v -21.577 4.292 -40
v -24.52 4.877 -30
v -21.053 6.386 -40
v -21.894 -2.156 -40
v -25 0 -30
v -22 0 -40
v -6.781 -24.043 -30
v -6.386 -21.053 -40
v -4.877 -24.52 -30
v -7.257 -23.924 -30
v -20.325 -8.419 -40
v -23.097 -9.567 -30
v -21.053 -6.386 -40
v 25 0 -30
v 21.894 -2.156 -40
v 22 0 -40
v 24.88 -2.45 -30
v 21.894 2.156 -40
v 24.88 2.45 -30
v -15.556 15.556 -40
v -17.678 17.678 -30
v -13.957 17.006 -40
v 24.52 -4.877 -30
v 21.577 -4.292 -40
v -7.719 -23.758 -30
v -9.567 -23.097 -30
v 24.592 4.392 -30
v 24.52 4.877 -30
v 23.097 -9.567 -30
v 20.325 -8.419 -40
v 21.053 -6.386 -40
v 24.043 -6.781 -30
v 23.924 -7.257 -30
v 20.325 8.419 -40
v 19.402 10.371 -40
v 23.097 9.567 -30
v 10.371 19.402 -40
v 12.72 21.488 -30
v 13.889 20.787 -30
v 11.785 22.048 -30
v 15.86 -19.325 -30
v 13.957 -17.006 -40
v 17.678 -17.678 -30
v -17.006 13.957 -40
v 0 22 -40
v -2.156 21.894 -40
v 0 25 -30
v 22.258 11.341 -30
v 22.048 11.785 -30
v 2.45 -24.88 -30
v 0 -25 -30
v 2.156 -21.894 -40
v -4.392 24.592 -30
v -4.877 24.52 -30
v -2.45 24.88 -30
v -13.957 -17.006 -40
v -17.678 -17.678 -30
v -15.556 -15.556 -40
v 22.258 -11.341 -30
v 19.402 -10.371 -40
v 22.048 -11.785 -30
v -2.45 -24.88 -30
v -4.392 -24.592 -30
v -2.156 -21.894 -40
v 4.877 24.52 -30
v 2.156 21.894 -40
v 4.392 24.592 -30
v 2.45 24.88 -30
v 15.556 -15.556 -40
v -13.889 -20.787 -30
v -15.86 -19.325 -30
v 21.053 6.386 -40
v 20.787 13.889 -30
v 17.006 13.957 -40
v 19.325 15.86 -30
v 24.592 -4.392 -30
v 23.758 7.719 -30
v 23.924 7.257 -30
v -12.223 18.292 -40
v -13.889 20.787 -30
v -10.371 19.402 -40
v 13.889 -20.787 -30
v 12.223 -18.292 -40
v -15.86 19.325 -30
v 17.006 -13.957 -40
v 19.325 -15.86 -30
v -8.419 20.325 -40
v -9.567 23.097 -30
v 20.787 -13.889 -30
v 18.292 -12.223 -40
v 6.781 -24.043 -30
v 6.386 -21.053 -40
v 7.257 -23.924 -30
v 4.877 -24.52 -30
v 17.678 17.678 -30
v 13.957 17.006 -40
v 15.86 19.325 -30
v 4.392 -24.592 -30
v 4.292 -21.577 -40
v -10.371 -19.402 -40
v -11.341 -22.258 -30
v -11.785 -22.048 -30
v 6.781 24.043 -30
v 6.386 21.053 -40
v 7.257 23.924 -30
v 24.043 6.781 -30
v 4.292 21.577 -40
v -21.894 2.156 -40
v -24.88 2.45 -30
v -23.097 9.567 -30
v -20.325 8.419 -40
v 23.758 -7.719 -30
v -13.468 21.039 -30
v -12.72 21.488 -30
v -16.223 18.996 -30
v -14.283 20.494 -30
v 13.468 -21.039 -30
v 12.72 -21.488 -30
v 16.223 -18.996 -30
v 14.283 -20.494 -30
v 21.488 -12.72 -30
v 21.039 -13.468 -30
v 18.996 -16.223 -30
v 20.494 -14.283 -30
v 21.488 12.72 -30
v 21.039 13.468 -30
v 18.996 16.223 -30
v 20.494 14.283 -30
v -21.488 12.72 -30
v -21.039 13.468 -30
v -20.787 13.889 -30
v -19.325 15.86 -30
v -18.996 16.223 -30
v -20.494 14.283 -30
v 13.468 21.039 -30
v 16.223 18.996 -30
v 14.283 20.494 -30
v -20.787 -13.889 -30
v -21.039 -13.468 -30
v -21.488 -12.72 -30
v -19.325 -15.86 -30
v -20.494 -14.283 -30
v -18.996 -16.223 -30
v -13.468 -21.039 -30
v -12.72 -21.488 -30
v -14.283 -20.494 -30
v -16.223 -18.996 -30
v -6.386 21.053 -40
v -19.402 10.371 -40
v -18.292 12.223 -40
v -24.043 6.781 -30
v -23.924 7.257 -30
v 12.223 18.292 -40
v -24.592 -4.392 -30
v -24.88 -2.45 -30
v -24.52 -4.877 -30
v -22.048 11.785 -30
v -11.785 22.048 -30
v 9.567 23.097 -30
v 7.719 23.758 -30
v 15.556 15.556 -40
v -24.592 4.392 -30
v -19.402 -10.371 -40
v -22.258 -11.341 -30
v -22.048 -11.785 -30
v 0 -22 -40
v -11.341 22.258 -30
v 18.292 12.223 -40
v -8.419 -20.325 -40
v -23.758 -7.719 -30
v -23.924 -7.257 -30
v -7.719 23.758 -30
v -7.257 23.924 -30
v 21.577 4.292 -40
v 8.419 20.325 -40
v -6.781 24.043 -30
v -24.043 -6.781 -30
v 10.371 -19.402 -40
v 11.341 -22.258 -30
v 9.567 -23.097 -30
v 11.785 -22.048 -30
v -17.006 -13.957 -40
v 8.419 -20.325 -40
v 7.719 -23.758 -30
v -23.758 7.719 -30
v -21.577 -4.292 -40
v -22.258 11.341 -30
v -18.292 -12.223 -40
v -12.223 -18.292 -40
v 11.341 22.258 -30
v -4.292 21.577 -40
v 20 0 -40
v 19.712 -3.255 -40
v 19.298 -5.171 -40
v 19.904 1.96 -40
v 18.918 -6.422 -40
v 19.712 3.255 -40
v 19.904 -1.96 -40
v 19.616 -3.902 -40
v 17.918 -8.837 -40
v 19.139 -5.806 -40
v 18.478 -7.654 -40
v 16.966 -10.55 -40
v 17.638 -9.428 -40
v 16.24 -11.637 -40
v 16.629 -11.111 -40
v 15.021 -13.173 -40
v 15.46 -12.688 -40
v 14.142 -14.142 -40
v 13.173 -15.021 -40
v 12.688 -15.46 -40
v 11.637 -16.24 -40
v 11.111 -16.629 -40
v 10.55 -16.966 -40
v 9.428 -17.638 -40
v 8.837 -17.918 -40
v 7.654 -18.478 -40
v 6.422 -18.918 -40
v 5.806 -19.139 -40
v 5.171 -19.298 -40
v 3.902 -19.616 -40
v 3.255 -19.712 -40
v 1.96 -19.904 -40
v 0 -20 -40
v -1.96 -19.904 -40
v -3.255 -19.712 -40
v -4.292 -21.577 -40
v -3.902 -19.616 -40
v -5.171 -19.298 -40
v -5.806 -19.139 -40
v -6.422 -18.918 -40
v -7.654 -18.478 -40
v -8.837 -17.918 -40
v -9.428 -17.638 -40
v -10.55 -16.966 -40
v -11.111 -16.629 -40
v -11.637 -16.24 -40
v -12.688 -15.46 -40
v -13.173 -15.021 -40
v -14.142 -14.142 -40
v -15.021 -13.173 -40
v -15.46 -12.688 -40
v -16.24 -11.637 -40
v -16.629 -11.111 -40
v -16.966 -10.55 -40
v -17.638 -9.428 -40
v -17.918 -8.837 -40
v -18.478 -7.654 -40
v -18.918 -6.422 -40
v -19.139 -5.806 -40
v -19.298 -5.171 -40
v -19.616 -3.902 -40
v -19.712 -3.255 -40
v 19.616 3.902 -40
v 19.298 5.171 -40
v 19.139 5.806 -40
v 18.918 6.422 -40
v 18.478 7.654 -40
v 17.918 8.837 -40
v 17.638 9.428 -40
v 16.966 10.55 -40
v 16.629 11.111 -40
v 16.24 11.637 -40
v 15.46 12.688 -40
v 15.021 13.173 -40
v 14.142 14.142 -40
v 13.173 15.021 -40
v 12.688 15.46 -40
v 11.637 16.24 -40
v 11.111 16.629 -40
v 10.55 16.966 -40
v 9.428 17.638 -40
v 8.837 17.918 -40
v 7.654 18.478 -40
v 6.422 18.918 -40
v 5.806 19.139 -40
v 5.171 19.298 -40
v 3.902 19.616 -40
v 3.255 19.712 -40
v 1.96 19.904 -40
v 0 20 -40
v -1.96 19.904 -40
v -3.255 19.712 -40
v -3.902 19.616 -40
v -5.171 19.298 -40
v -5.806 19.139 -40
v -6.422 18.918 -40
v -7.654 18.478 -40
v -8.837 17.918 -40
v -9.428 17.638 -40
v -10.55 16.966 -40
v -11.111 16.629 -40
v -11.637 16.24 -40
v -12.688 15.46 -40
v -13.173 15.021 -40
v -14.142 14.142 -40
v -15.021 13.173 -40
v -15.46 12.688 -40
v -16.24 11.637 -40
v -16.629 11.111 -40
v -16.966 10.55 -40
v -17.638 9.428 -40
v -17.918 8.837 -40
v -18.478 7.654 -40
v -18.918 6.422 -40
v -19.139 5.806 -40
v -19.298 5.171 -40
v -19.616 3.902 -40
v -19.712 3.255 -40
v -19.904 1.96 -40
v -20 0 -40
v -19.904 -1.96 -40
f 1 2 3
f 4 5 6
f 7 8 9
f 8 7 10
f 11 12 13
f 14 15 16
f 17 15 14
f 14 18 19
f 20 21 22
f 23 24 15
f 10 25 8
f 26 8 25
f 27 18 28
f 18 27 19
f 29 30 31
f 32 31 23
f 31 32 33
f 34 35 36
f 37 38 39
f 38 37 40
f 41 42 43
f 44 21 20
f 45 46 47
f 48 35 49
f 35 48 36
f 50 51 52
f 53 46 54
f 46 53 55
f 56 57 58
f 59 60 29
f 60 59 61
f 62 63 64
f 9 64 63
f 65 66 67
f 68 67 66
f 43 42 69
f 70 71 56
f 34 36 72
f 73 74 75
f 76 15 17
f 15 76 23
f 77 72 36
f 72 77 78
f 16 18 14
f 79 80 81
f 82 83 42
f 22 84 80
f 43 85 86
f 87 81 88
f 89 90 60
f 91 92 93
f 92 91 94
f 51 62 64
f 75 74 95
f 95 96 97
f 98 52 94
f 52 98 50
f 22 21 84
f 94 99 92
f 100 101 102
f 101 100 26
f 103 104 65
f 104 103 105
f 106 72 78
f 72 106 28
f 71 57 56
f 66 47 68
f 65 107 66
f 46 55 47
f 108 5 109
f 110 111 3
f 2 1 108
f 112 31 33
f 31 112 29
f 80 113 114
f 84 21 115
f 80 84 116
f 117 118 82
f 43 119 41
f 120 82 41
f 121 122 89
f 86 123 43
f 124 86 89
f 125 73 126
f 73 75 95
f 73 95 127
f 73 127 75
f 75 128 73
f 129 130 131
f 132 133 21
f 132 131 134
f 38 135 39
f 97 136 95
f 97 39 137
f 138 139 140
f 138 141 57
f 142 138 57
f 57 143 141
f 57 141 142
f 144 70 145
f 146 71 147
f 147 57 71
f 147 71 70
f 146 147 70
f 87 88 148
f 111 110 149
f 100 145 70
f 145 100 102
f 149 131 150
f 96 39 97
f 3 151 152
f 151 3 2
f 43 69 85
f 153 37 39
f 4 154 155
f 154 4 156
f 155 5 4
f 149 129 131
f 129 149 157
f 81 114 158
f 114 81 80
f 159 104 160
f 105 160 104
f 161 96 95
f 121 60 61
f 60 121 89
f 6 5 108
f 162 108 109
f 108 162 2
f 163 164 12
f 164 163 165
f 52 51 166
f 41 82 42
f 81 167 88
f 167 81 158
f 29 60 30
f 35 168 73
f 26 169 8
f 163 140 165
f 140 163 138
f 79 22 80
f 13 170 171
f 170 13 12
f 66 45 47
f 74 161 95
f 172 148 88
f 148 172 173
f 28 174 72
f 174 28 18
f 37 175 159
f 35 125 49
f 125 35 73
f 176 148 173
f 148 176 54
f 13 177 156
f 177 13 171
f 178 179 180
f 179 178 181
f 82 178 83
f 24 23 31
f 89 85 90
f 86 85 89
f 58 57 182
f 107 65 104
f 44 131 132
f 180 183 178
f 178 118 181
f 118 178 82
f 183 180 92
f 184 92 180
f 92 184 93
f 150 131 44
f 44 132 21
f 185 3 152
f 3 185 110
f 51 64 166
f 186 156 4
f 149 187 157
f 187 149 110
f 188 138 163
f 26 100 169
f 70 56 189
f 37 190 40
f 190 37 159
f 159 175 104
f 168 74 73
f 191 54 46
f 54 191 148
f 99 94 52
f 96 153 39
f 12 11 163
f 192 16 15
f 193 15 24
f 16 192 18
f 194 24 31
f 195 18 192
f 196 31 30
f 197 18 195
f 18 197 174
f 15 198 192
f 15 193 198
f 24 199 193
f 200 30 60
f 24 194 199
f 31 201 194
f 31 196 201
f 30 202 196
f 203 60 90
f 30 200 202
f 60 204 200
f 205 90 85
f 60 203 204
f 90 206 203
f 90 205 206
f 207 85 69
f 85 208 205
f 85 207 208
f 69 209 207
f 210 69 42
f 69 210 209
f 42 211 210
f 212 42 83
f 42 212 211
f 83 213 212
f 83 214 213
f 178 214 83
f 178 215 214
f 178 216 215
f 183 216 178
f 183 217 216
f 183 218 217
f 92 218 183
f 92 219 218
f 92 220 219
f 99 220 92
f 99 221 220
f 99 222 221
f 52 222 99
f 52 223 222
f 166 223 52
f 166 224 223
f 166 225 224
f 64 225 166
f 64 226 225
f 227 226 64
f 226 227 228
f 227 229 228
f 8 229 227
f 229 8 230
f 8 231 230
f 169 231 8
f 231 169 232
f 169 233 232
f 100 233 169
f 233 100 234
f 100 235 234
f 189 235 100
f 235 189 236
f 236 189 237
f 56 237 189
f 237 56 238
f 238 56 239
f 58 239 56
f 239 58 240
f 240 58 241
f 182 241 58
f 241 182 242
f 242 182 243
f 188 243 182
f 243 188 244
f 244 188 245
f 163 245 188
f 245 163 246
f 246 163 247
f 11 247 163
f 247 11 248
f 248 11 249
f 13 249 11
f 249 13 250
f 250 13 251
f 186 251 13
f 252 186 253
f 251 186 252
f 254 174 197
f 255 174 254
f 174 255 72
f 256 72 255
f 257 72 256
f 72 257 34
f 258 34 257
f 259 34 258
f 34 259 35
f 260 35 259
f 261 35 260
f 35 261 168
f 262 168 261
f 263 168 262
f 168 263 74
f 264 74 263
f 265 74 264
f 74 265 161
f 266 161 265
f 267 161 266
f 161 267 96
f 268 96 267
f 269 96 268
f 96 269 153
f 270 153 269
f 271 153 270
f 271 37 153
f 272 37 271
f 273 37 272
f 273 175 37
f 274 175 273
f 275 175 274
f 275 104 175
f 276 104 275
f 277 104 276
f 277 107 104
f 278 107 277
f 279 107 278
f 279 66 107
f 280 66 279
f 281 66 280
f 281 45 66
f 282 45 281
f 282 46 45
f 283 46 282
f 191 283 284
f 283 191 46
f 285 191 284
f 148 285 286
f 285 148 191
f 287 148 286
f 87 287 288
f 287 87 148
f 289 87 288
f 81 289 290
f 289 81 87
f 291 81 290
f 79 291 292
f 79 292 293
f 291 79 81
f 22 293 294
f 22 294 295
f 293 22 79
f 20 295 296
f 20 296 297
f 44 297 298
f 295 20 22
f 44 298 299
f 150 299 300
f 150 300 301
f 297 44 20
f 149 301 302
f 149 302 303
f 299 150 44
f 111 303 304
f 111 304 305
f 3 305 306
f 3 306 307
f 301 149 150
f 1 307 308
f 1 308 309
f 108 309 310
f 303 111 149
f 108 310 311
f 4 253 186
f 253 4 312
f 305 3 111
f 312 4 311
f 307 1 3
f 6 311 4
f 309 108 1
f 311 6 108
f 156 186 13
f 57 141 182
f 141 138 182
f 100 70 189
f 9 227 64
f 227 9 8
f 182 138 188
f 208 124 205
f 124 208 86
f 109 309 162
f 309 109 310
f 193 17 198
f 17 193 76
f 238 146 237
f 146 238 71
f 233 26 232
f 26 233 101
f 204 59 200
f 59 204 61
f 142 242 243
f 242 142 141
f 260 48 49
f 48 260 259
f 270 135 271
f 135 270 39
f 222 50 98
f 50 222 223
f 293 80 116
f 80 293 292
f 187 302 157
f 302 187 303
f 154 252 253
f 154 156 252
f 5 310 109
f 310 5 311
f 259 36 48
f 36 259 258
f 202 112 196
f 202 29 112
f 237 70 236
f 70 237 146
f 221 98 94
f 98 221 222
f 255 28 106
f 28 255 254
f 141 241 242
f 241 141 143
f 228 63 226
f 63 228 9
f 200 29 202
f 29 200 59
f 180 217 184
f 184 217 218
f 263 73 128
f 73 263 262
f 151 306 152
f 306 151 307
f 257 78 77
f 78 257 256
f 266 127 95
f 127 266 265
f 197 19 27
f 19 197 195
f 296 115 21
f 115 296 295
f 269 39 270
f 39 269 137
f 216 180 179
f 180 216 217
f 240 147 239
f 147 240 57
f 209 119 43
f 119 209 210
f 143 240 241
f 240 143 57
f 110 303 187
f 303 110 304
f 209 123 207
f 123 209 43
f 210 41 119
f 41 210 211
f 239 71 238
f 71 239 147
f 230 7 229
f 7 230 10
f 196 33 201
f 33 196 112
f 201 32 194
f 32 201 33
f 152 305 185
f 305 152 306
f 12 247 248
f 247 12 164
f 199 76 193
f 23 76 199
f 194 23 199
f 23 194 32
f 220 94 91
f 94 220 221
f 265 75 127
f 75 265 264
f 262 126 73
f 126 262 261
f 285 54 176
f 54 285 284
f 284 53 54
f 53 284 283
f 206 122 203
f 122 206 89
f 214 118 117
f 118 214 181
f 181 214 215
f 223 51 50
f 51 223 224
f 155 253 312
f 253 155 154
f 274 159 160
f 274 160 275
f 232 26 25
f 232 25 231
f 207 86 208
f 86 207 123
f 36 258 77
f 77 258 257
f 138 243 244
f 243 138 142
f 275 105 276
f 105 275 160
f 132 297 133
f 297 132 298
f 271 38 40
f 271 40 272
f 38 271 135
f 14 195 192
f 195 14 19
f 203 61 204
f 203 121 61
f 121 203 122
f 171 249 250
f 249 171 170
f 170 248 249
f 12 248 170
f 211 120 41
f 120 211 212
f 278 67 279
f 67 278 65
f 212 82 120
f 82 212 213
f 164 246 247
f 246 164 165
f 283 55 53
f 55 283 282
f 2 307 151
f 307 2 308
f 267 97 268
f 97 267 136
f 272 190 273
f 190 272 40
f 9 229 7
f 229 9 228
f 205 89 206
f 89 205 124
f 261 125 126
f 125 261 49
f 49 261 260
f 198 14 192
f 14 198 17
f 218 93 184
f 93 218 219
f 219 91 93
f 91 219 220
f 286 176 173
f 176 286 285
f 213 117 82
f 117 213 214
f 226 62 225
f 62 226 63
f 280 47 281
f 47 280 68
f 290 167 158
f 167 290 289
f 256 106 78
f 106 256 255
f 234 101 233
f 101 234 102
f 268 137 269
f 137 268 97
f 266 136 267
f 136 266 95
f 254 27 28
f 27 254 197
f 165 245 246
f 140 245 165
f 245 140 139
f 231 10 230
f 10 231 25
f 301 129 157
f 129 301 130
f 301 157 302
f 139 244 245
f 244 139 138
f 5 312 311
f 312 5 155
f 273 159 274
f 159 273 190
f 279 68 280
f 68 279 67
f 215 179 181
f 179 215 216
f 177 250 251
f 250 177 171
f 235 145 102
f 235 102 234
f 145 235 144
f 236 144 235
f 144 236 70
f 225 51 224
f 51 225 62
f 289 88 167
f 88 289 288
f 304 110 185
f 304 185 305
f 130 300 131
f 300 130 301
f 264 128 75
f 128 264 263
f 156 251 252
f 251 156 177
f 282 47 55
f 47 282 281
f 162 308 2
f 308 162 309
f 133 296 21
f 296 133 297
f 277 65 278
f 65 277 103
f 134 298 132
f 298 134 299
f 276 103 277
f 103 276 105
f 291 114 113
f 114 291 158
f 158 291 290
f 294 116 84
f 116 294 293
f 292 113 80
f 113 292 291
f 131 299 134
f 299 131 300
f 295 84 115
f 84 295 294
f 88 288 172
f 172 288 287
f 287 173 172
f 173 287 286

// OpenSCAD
// Start: lazy_union
part1_2_mat2_5();
// End: lazy_union

// Modules.

// 'PartMaterial part1 2 - mat2 5.0'
module part1_2_mat2_5() {
  // 'None : _combine_solids_and_holes'
  union() {
    // '_combine_solids_and_holes'
    difference() {
      // 'default : _combine_solids_and_holes'
      union() {
        // ('ext', 2)
        multmatrix(m=[[1.0, 0.0, 0.0, 0.0], [0.0, -1.0, 0.0, 0.0], [0.0, 0.0, -1.0, -30.0], [0.0, 0.0, 0.0, 1.0]]) {
          // ('ext', 2)
          color(c=[1.0, 0.75, 0.2, 0.7]) {
            // "('ext', 2) : _combine_solids_and_holes"
            union() {
              // ('ext', 2)
              cylinder(h=10.0, r1=25.0, r2=22.0, center=false, $fn=64);
            }
          }
        }
      }
      // 'default'
      multmatrix(m=[[1.0, 0.0, 0.0, 0.0], [-0.0, -1.0, -0.0, -0.0], [-0.0, -0.0, -1.0, -0.0], [0.0, 0.0, 0.0, 1.0]]) {
        // 'master : _combine_solids_and_holes'
        union() {
          // 'master'
          cylinder(h=60.0, r1=40.0, r2=10.0, center=false, $fn=64);
        }
      }
    }
  }
} // end module part1_2_mat2_5
